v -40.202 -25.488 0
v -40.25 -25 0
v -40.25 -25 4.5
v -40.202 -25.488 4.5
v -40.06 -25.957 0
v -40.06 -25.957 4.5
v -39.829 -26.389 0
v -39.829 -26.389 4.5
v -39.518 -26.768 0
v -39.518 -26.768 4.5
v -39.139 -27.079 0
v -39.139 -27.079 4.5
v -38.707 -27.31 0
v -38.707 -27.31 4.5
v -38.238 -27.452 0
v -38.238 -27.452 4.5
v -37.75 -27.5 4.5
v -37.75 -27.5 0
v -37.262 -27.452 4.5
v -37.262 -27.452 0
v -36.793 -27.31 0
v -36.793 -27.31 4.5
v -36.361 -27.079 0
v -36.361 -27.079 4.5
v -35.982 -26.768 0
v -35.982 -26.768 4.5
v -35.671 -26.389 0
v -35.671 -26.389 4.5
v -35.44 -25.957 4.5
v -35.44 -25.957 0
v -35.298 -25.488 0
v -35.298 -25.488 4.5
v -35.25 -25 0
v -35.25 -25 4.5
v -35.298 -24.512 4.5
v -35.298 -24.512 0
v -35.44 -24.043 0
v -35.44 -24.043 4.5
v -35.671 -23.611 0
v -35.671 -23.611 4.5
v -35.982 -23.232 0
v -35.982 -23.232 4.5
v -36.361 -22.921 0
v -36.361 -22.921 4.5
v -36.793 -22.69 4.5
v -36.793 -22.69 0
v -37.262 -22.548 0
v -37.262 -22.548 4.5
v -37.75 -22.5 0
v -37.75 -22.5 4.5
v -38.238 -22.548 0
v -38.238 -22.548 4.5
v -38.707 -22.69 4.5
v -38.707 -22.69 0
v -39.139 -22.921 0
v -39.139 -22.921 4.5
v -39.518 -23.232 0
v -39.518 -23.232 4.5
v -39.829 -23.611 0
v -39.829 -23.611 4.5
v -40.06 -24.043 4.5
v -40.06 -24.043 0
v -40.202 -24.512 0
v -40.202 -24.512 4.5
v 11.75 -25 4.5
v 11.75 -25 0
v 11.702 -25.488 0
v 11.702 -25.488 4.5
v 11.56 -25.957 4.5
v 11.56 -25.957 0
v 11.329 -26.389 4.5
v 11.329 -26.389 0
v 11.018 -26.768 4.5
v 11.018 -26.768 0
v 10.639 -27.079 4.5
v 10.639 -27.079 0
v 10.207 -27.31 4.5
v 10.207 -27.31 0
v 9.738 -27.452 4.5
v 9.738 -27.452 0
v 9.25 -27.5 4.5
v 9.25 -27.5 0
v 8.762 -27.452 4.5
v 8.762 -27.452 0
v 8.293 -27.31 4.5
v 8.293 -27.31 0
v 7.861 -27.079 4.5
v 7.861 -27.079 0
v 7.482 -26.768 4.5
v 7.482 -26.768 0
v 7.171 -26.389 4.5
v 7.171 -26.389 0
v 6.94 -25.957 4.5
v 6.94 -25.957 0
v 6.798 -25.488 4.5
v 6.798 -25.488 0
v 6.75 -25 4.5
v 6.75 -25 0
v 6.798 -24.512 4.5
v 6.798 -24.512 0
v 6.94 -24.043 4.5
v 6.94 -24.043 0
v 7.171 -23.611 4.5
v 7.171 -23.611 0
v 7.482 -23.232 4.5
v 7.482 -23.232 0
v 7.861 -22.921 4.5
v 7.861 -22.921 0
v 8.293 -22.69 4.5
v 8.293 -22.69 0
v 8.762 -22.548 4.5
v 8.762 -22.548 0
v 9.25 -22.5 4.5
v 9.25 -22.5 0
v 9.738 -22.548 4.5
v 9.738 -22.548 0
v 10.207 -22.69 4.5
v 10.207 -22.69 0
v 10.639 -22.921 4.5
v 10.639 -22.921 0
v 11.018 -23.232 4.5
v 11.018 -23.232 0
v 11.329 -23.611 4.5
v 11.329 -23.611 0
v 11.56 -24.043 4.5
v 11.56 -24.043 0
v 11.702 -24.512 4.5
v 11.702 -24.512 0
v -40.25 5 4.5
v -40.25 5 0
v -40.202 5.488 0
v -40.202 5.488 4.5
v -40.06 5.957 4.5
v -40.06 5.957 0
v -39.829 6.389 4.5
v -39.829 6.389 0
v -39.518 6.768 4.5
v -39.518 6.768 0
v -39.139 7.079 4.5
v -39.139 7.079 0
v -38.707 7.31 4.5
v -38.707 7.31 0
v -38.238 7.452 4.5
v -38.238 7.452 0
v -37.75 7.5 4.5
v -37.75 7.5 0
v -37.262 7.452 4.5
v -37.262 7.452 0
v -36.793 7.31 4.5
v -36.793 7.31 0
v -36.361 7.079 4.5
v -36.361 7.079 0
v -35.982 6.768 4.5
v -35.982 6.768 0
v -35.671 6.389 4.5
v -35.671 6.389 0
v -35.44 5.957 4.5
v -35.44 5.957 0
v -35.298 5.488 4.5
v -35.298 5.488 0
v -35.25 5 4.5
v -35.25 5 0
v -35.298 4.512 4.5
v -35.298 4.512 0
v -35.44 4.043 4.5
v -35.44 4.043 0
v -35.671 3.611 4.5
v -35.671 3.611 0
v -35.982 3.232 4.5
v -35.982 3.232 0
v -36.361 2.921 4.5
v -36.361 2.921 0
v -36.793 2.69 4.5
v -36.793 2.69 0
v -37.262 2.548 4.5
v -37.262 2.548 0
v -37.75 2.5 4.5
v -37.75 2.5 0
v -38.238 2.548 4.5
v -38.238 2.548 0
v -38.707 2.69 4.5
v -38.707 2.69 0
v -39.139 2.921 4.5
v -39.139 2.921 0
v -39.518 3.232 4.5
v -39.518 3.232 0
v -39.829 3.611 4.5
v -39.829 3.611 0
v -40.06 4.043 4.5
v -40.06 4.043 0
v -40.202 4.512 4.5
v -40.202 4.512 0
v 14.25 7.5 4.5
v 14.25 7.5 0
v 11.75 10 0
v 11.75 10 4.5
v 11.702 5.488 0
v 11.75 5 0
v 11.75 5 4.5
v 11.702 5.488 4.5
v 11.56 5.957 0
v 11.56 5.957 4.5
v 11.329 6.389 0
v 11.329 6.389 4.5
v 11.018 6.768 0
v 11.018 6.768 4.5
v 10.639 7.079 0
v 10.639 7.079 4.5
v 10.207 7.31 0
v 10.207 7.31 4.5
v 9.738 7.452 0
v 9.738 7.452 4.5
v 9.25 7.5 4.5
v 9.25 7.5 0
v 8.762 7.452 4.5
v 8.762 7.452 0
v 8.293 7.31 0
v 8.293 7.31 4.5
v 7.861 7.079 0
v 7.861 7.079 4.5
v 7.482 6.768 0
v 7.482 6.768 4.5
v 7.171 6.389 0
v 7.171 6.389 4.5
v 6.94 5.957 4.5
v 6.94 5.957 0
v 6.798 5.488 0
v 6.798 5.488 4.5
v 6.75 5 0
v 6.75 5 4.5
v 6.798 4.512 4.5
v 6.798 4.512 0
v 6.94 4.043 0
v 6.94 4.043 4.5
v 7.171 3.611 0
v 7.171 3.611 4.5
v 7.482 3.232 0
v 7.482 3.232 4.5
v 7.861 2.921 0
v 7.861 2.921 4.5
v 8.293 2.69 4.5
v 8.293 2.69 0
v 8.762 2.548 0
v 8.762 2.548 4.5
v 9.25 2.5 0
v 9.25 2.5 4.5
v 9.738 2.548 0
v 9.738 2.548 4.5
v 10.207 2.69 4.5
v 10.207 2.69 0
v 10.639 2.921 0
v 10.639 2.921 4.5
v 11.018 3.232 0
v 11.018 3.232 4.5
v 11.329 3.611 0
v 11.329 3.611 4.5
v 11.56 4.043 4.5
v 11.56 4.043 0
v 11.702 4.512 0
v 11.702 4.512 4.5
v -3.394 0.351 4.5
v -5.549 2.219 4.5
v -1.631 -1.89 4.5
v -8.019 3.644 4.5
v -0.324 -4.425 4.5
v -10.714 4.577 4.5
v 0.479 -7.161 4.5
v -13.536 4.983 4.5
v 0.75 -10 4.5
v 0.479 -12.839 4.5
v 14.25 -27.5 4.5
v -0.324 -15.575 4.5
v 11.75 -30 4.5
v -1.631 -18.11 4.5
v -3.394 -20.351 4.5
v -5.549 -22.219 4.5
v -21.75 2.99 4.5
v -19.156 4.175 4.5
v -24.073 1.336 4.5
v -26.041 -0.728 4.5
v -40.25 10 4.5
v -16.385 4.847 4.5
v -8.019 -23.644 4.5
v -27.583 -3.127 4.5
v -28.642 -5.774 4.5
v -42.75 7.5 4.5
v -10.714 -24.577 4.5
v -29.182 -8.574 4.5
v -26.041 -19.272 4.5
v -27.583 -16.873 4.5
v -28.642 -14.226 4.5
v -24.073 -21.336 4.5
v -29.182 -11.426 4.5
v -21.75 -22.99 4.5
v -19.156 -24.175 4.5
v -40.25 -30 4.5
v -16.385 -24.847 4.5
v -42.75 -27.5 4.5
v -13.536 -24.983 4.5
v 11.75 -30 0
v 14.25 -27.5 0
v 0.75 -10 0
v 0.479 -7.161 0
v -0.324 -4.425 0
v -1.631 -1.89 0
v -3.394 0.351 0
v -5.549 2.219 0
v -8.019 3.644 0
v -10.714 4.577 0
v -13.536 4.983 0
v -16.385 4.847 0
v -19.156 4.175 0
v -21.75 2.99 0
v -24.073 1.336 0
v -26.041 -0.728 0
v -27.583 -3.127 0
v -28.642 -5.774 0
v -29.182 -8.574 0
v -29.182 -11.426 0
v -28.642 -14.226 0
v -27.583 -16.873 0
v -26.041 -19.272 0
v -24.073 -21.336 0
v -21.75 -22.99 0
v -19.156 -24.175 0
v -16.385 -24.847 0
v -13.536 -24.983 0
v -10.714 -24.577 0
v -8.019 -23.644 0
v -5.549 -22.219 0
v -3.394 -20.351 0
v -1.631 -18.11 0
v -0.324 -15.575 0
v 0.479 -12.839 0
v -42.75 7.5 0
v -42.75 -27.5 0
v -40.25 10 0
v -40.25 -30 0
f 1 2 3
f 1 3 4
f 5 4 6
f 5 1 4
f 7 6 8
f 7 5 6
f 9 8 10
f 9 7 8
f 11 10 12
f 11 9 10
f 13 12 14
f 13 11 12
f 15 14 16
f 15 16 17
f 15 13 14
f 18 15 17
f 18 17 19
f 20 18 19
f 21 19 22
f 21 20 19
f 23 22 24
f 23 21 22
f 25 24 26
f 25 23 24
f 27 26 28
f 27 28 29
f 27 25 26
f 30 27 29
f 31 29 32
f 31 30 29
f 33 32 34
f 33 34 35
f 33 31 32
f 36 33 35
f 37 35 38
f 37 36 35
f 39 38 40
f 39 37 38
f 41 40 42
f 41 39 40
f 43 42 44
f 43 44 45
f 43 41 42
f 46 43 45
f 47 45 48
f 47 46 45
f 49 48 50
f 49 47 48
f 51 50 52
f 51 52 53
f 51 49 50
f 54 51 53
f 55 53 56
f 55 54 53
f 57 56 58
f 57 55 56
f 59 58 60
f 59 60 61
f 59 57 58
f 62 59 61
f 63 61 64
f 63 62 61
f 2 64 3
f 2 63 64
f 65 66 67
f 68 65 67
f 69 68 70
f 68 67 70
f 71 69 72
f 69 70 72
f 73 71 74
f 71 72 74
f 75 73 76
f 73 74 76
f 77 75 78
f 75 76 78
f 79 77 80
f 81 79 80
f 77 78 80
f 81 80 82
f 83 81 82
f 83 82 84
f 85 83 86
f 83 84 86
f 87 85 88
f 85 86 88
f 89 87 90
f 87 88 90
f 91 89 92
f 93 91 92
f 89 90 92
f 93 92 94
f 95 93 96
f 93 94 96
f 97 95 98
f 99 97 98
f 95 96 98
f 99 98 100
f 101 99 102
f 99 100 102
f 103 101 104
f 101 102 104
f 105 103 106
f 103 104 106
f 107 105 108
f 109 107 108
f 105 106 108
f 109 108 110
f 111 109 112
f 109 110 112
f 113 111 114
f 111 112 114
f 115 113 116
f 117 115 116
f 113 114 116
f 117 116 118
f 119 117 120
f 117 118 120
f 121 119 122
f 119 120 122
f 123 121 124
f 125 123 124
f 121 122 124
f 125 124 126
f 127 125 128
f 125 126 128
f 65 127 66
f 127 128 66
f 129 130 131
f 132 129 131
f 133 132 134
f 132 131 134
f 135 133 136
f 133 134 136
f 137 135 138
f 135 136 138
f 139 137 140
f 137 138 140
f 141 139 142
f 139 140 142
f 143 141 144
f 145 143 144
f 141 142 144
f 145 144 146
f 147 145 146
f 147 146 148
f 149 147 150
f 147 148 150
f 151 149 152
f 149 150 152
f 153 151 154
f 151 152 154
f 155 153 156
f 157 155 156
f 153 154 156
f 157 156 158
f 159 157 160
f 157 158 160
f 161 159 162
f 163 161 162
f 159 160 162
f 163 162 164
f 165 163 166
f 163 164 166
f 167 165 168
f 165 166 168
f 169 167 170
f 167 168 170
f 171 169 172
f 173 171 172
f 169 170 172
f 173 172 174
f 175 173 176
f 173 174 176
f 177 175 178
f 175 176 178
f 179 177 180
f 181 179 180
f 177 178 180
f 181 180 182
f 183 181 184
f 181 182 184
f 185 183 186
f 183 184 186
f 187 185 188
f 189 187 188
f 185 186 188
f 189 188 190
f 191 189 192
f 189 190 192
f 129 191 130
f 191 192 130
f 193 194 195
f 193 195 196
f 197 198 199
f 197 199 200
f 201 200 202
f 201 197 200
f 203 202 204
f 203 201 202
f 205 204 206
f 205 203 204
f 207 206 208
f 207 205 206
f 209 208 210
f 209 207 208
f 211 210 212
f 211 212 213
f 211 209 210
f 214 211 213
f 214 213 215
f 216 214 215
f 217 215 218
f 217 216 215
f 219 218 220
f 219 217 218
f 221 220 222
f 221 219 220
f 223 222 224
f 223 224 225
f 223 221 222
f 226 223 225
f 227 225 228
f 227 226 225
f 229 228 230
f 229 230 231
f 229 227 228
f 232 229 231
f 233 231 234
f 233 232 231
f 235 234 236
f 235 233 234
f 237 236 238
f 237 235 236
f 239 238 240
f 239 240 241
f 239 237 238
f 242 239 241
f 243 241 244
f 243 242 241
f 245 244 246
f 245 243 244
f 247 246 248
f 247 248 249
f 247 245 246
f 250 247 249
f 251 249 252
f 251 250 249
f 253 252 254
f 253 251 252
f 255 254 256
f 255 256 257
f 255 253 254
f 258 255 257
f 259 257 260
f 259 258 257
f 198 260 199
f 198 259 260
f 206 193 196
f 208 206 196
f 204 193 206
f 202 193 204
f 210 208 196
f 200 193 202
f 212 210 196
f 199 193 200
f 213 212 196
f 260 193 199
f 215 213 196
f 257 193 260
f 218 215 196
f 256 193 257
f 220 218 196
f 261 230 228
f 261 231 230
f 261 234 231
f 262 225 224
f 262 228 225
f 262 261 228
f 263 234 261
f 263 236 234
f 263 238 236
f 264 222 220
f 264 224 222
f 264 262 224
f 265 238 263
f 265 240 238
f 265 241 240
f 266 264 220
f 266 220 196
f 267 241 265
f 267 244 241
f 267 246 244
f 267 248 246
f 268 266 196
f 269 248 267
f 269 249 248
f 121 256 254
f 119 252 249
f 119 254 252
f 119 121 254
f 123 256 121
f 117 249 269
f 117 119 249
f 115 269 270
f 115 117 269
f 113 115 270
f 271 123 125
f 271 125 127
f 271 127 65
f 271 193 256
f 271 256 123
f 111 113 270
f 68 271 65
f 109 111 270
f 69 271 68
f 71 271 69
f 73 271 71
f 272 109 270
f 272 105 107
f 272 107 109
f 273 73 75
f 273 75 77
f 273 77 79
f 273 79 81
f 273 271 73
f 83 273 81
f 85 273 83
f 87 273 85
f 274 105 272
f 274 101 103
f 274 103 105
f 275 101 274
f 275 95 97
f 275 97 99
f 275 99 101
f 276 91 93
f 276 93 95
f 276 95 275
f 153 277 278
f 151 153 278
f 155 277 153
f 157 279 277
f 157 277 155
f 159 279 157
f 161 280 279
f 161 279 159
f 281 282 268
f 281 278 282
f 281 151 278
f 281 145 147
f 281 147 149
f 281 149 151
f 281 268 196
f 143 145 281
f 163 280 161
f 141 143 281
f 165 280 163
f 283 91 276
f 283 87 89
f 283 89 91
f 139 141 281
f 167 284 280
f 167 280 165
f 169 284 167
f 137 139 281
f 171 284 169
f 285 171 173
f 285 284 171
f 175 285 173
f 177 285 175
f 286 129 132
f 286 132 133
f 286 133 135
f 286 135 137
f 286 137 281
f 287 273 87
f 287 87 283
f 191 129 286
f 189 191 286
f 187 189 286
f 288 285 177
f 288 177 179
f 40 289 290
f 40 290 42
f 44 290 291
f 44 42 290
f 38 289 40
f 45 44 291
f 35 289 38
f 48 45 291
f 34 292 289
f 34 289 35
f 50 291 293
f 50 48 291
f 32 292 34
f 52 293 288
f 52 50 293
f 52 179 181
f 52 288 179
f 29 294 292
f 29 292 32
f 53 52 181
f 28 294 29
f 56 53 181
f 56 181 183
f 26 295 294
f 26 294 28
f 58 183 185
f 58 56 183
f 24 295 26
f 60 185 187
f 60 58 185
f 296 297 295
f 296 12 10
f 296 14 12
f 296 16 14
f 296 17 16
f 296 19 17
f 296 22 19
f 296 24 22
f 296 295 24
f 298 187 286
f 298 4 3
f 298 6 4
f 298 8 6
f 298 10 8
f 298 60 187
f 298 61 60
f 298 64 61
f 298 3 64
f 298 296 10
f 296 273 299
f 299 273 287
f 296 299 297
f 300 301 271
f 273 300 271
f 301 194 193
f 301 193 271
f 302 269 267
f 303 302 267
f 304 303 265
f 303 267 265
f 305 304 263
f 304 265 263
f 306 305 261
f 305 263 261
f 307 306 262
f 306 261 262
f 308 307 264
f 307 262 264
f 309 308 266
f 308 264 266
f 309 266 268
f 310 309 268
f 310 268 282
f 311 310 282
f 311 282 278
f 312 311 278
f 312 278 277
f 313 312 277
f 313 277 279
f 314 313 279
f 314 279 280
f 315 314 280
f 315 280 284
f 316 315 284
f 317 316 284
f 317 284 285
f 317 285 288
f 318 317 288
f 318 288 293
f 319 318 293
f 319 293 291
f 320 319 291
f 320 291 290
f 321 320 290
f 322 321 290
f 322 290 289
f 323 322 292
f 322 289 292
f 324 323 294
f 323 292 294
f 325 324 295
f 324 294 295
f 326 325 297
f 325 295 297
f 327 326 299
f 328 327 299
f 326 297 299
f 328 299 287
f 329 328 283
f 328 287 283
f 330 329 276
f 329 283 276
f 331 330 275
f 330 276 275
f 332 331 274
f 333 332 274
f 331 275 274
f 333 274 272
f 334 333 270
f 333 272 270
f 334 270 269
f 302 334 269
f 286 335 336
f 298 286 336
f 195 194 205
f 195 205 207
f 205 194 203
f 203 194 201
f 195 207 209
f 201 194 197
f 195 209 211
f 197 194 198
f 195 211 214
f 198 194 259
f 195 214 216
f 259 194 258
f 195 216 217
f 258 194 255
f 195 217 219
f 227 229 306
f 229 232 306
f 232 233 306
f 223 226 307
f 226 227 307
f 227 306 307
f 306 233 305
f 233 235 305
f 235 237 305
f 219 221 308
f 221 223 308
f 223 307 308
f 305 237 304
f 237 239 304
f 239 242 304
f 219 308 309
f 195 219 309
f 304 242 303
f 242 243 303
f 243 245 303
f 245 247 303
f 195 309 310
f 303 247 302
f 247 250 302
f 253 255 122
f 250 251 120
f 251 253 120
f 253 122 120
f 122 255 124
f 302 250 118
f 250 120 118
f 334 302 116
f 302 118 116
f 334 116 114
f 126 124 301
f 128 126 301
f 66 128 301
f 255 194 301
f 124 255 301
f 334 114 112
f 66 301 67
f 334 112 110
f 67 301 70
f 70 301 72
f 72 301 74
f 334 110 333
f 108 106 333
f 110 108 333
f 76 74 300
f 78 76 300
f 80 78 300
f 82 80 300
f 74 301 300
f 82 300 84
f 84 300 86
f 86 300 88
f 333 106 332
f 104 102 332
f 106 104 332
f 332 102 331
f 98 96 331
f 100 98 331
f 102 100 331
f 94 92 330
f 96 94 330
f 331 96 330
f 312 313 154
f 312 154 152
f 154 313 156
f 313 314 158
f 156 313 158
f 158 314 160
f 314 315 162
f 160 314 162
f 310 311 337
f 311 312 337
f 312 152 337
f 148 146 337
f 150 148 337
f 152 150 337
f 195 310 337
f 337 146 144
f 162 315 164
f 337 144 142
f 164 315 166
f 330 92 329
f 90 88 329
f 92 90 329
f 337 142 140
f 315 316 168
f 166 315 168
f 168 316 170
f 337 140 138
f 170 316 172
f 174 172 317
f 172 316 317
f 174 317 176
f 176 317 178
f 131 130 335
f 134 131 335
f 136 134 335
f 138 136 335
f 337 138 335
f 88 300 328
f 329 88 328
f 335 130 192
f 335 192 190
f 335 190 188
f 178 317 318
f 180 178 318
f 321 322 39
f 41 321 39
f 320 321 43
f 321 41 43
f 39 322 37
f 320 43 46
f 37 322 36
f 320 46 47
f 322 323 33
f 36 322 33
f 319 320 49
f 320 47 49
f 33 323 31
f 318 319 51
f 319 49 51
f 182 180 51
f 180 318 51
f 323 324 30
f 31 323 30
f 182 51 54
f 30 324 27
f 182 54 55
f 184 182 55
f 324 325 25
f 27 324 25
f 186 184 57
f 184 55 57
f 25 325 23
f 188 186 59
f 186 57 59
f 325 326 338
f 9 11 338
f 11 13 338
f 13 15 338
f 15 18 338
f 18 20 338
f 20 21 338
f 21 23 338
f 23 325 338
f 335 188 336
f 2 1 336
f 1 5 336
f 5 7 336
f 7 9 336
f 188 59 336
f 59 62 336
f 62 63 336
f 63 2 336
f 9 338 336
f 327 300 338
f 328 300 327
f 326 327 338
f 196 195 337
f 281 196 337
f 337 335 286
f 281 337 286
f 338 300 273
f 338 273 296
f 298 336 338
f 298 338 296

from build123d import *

# Parameters (mm, degrees)
SKETCH_1_W          = 28.5
SKETCH_1_H          = 20
SKETCH_1_R          = 2.5
EXTRUDE_1_DEPTH     = 4.5
CHAMFER_1_SIZE      = 2.5
SKETCH_2_R          = 15
CUT_EXTRUDE_1_DEPTH = 5.5


with BuildPart() as part:
    # Эскиз1 → Бобышка-Вытянуть1 (new body)
    with BuildSketch(Plane.XY):
        Rectangle(SKETCH_1_W, SKETCH_1_H)
        with Locations((9.25, 5)):
            Circle(SKETCH_1_R, mode=Mode.SUBTRACT)
    extrude(amount=EXTRUDE_1_DEPTH)

    # Фаска1
    chamfer_1_edges = [part.edges().sort_by_distance(p)[0] for p in [
        (14.25, 10, 2.25),
    ]]
    chamfer(chamfer_1_edges, length=CHAMFER_1_SIZE)

    # Зеркальное отражение1: part across plane


with BuildPart() as part_1:
    add(part.part)
    add(part.part.mirror(Plane(origin=(-14.25, -10, 4.5), x_dir=(0, 0, 1), z_dir=(0, 1, 0))))

    # Зеркальное отражение2: part across plane


with BuildPart() as part_2:
    add(part_1.part)
    add(part_1.part.mirror(Plane(origin=(-14.25, -10, 4.5), x_dir=(0, 0, 1), z_dir=(1, 0, 0))))

    # Эскиз2 → Вырез-Вытянуть1 (cut, through all)
    with BuildSketch(Plane.XY.offset(4.5)):
        with Locations((-14.25, -10)):
            Circle(SKETCH_2_R)
    extrude(amount=-CUT_EXTRUDE_1_DEPTH, mode=Mode.SUBTRACT)


solid = part_2.part
